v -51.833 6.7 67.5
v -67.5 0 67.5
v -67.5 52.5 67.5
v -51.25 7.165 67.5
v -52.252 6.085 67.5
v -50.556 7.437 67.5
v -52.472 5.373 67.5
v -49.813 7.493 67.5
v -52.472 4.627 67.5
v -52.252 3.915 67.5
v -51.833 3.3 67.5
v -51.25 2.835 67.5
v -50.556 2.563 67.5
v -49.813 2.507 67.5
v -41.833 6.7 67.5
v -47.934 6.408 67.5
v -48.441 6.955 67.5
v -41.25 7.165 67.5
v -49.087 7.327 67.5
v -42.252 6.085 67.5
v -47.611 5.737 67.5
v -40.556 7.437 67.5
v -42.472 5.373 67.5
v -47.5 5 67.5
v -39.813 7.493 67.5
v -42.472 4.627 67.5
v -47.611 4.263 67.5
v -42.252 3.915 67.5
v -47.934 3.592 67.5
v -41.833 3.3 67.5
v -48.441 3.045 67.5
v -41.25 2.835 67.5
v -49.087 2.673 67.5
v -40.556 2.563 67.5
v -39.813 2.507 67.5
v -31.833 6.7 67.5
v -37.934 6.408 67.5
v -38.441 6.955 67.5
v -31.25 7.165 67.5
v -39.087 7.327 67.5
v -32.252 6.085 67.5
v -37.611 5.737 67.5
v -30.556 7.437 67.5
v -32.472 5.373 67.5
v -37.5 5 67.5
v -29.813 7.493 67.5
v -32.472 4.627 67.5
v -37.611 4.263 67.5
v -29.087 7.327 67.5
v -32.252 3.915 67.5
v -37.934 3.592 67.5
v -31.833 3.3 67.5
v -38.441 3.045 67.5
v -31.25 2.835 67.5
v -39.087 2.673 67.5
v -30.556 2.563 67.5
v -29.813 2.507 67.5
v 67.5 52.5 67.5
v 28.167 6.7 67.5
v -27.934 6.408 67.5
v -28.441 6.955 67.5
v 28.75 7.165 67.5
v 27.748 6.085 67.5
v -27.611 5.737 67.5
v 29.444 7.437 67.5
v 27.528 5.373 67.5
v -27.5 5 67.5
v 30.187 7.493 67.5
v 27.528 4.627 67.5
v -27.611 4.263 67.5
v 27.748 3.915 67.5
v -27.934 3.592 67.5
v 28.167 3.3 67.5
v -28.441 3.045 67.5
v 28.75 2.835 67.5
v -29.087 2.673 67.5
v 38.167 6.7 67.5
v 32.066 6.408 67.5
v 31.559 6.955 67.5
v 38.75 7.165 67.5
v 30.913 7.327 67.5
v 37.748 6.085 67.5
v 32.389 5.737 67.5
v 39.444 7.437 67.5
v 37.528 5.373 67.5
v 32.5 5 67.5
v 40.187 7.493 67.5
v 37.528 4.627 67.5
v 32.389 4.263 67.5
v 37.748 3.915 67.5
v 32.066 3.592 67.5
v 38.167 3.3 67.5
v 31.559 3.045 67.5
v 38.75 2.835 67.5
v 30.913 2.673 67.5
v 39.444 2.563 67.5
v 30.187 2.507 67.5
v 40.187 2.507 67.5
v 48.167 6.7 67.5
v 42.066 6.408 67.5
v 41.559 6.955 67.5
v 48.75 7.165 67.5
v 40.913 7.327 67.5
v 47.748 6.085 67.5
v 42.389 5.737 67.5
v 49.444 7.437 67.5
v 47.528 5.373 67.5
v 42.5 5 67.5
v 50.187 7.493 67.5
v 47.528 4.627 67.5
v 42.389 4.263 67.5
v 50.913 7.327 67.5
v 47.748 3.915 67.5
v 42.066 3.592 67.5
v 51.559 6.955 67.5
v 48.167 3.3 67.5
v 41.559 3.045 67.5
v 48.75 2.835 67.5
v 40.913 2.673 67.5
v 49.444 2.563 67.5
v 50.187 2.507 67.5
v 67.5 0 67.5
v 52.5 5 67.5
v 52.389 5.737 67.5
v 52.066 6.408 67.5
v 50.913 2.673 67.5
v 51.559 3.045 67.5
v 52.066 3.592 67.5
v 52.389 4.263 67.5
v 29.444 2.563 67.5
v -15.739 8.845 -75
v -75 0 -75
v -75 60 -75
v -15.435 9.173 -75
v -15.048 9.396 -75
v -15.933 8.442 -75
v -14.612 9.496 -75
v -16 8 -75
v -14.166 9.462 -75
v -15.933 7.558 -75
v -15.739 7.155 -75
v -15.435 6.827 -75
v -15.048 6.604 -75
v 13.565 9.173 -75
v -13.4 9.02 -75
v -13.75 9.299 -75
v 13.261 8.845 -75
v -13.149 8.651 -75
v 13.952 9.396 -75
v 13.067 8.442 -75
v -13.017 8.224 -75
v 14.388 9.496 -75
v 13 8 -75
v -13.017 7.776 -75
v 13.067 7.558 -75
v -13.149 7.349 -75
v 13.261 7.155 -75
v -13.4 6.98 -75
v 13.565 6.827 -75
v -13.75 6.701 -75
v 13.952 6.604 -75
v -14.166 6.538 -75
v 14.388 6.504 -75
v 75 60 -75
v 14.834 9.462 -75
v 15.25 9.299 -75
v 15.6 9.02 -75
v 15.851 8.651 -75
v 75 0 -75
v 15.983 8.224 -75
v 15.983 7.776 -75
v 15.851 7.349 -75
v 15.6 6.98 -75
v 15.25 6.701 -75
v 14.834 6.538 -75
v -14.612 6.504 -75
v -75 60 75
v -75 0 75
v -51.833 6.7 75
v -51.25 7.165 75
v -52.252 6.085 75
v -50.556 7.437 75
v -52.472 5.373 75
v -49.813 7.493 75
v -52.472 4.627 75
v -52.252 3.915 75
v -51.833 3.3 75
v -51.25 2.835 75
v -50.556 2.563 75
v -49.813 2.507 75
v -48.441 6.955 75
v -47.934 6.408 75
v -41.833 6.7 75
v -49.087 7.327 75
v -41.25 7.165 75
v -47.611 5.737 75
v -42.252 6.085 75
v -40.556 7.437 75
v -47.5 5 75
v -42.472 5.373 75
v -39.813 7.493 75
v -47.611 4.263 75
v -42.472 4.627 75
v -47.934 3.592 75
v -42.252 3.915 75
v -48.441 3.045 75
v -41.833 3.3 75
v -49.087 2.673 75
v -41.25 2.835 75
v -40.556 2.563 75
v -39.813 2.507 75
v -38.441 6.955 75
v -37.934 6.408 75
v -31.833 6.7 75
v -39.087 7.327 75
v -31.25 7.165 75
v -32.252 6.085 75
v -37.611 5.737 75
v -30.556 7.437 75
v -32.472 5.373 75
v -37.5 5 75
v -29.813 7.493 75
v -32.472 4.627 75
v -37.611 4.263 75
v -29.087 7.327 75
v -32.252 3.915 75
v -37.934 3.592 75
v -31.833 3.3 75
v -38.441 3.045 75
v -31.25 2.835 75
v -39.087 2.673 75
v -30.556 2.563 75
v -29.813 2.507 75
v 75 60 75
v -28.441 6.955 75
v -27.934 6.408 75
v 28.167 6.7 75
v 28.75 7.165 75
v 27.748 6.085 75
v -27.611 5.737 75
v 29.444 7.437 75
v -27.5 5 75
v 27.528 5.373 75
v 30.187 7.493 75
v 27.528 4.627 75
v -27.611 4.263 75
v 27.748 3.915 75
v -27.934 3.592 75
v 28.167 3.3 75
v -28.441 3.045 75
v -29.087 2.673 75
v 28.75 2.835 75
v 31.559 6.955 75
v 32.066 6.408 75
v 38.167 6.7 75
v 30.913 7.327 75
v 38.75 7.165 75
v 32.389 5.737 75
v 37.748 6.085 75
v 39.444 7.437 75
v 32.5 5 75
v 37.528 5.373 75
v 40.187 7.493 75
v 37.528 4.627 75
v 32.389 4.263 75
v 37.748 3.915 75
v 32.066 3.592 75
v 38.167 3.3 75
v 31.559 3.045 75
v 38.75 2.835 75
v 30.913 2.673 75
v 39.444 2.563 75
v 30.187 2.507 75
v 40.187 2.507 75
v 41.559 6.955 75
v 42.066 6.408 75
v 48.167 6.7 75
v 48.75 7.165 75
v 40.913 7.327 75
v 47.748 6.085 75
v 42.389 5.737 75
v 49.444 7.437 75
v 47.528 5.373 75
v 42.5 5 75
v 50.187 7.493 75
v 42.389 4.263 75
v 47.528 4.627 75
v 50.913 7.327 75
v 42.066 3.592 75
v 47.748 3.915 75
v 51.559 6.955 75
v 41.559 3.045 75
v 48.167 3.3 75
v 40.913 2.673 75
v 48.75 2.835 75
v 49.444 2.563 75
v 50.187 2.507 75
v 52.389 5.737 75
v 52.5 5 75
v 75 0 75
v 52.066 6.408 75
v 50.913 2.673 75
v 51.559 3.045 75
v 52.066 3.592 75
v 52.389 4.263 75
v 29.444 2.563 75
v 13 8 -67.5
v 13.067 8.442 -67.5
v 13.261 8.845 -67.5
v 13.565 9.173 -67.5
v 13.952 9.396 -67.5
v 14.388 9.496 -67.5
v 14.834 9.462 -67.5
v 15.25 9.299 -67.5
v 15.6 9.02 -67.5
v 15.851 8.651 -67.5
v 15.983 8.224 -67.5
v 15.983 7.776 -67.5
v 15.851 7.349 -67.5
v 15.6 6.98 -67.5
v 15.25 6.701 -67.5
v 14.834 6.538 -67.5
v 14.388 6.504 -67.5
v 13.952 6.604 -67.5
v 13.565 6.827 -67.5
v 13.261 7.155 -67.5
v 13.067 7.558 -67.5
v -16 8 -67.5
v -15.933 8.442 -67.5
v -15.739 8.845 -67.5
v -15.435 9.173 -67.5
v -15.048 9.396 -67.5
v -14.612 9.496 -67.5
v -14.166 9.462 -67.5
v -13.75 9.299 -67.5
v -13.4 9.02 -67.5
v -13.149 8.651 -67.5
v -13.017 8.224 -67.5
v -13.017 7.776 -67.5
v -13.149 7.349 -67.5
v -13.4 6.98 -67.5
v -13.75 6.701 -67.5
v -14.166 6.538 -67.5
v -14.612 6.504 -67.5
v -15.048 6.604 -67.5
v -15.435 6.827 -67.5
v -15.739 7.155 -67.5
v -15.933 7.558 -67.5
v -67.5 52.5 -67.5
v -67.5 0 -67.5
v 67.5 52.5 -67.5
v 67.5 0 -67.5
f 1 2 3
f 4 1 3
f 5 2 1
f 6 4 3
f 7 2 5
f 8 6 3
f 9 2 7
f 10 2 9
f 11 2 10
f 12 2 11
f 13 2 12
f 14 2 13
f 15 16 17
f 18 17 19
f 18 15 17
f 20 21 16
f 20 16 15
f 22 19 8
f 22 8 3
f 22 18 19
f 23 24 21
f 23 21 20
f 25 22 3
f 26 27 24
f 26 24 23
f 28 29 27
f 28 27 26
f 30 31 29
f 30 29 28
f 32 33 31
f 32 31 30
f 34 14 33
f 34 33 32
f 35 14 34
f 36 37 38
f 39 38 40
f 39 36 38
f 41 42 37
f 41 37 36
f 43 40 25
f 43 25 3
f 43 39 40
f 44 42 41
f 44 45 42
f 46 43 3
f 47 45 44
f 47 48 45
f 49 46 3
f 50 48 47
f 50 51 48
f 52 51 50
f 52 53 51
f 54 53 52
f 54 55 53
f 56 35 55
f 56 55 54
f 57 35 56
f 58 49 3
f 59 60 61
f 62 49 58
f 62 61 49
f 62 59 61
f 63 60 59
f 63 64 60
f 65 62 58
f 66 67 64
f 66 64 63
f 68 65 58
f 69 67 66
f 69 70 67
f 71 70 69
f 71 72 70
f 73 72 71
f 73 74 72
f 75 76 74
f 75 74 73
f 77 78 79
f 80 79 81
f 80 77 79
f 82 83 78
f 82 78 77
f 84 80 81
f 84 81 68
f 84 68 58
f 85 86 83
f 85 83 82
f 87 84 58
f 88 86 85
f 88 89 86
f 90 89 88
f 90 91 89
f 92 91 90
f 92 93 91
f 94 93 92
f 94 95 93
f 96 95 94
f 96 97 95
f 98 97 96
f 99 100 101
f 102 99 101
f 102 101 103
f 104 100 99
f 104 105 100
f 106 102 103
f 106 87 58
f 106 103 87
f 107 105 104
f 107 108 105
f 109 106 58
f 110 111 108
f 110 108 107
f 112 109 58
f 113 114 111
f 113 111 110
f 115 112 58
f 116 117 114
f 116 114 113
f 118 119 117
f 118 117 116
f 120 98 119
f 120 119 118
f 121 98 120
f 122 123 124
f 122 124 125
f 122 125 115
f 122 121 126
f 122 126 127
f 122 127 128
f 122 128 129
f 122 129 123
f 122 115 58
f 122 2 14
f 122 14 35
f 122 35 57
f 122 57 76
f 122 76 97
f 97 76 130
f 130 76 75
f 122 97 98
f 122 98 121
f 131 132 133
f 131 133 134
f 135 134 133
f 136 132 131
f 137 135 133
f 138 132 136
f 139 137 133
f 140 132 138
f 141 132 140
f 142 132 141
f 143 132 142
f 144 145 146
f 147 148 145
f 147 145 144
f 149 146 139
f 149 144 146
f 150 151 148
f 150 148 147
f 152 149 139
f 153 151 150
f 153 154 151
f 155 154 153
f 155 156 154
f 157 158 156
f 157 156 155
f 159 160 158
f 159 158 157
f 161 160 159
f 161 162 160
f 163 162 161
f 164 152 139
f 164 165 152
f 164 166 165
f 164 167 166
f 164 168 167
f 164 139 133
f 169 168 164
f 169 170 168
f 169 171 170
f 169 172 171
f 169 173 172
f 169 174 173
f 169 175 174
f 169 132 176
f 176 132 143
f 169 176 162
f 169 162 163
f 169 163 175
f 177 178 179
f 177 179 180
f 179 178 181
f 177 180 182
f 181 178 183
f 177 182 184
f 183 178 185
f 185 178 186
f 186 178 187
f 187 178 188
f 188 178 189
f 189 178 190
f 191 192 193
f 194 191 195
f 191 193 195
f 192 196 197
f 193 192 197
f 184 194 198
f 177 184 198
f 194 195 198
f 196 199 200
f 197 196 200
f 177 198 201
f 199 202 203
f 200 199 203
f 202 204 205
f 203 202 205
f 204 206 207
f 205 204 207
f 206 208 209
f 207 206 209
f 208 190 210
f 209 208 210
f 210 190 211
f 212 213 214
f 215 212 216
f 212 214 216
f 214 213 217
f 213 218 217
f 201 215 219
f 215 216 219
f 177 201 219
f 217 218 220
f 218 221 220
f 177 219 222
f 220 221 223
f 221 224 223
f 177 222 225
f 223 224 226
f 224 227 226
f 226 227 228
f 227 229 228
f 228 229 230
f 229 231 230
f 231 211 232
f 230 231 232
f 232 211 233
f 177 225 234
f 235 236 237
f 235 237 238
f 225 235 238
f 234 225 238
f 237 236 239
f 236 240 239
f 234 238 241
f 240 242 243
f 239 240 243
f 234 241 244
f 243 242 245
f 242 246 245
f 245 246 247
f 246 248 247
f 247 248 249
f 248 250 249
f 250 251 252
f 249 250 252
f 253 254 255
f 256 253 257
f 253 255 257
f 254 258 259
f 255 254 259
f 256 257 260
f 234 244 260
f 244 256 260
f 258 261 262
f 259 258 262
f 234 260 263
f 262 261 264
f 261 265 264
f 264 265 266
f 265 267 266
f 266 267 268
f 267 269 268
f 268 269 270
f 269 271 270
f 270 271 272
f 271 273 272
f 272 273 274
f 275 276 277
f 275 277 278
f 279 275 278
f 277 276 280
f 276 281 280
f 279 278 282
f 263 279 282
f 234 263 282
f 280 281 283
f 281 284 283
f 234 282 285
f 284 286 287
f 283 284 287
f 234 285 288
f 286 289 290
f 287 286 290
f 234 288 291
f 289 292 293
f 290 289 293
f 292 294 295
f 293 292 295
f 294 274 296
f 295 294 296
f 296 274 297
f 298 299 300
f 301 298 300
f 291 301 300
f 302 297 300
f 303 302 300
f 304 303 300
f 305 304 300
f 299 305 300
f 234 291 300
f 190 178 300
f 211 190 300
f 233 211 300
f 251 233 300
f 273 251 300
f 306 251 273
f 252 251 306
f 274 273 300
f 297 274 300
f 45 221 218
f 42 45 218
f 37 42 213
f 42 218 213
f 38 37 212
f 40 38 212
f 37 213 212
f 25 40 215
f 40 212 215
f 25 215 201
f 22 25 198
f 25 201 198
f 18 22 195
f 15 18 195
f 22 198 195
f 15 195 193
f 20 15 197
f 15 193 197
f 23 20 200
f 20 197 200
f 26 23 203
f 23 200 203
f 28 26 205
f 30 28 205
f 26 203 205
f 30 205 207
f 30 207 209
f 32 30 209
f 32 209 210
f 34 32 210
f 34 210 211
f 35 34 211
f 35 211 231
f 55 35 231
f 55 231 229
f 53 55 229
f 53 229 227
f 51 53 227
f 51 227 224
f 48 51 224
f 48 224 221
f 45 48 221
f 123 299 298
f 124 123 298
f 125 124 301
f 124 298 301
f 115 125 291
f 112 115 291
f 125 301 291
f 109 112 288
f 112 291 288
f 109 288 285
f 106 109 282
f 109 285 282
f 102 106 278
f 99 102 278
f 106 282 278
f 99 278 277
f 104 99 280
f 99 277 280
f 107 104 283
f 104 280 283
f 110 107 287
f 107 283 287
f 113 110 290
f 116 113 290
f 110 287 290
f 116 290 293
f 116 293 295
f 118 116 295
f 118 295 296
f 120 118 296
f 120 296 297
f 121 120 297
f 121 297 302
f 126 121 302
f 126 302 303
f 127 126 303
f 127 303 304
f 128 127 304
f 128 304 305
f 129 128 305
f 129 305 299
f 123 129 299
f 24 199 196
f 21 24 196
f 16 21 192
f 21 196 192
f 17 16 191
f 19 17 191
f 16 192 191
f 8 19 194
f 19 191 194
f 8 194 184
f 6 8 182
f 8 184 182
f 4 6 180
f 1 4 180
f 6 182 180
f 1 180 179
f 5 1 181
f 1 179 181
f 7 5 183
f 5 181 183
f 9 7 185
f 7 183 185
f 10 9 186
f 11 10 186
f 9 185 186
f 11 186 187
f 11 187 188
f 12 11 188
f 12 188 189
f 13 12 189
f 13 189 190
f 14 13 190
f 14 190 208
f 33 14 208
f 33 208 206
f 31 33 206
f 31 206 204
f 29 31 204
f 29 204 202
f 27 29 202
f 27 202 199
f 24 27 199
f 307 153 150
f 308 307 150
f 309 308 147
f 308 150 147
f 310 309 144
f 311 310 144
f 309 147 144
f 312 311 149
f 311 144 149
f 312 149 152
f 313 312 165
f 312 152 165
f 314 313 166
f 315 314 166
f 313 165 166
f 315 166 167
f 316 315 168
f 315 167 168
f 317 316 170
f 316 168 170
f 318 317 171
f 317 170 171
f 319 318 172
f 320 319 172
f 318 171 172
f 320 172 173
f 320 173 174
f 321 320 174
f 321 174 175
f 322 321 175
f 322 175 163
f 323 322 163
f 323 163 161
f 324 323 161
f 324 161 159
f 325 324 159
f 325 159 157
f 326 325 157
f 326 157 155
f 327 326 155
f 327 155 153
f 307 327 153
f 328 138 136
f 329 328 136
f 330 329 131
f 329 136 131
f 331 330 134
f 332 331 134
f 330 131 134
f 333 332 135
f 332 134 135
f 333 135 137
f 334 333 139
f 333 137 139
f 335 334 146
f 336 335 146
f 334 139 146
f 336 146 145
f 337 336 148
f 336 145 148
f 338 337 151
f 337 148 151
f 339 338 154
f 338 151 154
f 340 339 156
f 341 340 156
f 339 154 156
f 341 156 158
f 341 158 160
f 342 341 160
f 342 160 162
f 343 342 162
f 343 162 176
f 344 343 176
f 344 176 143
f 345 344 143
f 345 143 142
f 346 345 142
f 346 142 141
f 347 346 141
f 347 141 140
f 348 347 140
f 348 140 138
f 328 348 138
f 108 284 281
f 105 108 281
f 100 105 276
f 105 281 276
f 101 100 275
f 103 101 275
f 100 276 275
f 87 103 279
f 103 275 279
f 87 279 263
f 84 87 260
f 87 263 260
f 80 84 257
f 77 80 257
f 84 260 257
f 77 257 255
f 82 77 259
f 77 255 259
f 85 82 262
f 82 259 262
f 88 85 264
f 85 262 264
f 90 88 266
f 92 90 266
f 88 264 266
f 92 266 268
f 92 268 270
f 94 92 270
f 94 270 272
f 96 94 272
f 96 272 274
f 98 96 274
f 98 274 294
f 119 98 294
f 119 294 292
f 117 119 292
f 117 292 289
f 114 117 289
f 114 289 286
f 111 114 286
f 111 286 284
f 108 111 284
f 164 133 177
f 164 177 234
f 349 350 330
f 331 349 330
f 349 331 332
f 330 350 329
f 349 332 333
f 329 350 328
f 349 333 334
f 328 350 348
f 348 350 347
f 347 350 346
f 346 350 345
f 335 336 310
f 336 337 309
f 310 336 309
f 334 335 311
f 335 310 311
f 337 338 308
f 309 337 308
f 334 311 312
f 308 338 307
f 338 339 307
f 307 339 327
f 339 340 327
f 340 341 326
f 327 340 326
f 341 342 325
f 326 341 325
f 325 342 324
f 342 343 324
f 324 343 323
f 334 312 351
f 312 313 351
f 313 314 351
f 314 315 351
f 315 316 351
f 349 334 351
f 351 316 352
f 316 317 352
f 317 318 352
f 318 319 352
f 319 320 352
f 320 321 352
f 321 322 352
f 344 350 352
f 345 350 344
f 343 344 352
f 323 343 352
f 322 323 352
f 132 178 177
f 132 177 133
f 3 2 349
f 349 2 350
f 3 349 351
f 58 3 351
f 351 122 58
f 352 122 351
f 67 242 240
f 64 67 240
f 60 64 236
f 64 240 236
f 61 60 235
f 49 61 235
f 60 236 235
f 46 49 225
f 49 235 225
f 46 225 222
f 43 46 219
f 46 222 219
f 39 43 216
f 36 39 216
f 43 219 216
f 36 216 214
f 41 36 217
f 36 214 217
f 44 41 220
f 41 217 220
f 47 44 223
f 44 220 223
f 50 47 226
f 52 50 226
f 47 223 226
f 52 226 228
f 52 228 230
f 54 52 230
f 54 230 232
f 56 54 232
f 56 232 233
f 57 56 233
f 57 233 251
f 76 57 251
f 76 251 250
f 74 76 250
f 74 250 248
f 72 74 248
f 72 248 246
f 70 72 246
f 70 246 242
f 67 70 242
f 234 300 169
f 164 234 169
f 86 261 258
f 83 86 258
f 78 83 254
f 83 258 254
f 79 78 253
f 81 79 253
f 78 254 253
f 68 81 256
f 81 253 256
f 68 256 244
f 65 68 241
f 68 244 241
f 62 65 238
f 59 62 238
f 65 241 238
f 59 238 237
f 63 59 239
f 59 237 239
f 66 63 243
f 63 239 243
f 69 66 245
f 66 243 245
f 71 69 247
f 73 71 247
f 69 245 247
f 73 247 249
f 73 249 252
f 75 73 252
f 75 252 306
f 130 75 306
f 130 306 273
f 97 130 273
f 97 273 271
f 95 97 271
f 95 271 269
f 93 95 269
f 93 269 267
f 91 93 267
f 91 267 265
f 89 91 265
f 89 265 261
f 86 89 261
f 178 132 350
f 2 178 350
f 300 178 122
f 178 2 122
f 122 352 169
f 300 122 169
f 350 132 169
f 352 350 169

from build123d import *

# Parameters (mm, degrees)
SKETCH1_W           = 150
SKETCH1_H           = 150
BOSS_EXTRUDE1_DEPTH = 60
SHELL1_T            = -7.5
SKETCH5_R           = 2.5
CUT_EXTRUDE2_DEPTH  = 10
SKETCH6_R           = 1.5
CUT_EXTRUDE3_DEPTH  = 10


with BuildPart() as part:
    # Sketch1 → Boss-Extrude1 (new body)
    with BuildSketch(Plane(origin=(0, 0, 0), x_dir=(1, 0, 0), z_dir=(0, 1, 0))):
        Rectangle(SKETCH1_W, SKETCH1_H)
    extrude(amount=BOSS_EXTRUDE1_DEPTH)

    # Shell1
    shell1_openings = [part.faces().sort_by_distance(p)[0] for p in [
        (0, 0, 0),
    ]]
    offset(amount=SHELL1_T, openings=shell1_openings, kind=Kind.INTERSECTION)

    # Sketch5 → Cut-Extrude2 (cut)
    with BuildSketch(Plane.XY.offset(75)):
        with Locations((-50, 5)):
            Circle(SKETCH5_R)
        with Locations((-40, 5)):
            Circle(SKETCH5_R)
        with Locations((-30, 5)):
            Circle(SKETCH5_R)
        with Locations((30, 5)):
            Circle(SKETCH5_R)
        with Locations((40, 5)):
            Circle(SKETCH5_R)
        with Locations((50, 5)):
            Circle(SKETCH5_R)
    extrude(amount=-CUT_EXTRUDE2_DEPTH, mode=Mode.SUBTRACT)

    # Sketch6 → Cut-Extrude3 (cut)
    with BuildSketch(Plane(origin=(0, 0, -75), x_dir=(-1, 0, 0), z_dir=(0, 0, -1))):
        with Locations((-14.5, 8)):
            Circle(SKETCH6_R)
        with Locations((14.5, 8)):
            Circle(SKETCH6_R)
    extrude(amount=-CUT_EXTRUDE3_DEPTH, mode=Mode.SUBTRACT)


solid = part.part
